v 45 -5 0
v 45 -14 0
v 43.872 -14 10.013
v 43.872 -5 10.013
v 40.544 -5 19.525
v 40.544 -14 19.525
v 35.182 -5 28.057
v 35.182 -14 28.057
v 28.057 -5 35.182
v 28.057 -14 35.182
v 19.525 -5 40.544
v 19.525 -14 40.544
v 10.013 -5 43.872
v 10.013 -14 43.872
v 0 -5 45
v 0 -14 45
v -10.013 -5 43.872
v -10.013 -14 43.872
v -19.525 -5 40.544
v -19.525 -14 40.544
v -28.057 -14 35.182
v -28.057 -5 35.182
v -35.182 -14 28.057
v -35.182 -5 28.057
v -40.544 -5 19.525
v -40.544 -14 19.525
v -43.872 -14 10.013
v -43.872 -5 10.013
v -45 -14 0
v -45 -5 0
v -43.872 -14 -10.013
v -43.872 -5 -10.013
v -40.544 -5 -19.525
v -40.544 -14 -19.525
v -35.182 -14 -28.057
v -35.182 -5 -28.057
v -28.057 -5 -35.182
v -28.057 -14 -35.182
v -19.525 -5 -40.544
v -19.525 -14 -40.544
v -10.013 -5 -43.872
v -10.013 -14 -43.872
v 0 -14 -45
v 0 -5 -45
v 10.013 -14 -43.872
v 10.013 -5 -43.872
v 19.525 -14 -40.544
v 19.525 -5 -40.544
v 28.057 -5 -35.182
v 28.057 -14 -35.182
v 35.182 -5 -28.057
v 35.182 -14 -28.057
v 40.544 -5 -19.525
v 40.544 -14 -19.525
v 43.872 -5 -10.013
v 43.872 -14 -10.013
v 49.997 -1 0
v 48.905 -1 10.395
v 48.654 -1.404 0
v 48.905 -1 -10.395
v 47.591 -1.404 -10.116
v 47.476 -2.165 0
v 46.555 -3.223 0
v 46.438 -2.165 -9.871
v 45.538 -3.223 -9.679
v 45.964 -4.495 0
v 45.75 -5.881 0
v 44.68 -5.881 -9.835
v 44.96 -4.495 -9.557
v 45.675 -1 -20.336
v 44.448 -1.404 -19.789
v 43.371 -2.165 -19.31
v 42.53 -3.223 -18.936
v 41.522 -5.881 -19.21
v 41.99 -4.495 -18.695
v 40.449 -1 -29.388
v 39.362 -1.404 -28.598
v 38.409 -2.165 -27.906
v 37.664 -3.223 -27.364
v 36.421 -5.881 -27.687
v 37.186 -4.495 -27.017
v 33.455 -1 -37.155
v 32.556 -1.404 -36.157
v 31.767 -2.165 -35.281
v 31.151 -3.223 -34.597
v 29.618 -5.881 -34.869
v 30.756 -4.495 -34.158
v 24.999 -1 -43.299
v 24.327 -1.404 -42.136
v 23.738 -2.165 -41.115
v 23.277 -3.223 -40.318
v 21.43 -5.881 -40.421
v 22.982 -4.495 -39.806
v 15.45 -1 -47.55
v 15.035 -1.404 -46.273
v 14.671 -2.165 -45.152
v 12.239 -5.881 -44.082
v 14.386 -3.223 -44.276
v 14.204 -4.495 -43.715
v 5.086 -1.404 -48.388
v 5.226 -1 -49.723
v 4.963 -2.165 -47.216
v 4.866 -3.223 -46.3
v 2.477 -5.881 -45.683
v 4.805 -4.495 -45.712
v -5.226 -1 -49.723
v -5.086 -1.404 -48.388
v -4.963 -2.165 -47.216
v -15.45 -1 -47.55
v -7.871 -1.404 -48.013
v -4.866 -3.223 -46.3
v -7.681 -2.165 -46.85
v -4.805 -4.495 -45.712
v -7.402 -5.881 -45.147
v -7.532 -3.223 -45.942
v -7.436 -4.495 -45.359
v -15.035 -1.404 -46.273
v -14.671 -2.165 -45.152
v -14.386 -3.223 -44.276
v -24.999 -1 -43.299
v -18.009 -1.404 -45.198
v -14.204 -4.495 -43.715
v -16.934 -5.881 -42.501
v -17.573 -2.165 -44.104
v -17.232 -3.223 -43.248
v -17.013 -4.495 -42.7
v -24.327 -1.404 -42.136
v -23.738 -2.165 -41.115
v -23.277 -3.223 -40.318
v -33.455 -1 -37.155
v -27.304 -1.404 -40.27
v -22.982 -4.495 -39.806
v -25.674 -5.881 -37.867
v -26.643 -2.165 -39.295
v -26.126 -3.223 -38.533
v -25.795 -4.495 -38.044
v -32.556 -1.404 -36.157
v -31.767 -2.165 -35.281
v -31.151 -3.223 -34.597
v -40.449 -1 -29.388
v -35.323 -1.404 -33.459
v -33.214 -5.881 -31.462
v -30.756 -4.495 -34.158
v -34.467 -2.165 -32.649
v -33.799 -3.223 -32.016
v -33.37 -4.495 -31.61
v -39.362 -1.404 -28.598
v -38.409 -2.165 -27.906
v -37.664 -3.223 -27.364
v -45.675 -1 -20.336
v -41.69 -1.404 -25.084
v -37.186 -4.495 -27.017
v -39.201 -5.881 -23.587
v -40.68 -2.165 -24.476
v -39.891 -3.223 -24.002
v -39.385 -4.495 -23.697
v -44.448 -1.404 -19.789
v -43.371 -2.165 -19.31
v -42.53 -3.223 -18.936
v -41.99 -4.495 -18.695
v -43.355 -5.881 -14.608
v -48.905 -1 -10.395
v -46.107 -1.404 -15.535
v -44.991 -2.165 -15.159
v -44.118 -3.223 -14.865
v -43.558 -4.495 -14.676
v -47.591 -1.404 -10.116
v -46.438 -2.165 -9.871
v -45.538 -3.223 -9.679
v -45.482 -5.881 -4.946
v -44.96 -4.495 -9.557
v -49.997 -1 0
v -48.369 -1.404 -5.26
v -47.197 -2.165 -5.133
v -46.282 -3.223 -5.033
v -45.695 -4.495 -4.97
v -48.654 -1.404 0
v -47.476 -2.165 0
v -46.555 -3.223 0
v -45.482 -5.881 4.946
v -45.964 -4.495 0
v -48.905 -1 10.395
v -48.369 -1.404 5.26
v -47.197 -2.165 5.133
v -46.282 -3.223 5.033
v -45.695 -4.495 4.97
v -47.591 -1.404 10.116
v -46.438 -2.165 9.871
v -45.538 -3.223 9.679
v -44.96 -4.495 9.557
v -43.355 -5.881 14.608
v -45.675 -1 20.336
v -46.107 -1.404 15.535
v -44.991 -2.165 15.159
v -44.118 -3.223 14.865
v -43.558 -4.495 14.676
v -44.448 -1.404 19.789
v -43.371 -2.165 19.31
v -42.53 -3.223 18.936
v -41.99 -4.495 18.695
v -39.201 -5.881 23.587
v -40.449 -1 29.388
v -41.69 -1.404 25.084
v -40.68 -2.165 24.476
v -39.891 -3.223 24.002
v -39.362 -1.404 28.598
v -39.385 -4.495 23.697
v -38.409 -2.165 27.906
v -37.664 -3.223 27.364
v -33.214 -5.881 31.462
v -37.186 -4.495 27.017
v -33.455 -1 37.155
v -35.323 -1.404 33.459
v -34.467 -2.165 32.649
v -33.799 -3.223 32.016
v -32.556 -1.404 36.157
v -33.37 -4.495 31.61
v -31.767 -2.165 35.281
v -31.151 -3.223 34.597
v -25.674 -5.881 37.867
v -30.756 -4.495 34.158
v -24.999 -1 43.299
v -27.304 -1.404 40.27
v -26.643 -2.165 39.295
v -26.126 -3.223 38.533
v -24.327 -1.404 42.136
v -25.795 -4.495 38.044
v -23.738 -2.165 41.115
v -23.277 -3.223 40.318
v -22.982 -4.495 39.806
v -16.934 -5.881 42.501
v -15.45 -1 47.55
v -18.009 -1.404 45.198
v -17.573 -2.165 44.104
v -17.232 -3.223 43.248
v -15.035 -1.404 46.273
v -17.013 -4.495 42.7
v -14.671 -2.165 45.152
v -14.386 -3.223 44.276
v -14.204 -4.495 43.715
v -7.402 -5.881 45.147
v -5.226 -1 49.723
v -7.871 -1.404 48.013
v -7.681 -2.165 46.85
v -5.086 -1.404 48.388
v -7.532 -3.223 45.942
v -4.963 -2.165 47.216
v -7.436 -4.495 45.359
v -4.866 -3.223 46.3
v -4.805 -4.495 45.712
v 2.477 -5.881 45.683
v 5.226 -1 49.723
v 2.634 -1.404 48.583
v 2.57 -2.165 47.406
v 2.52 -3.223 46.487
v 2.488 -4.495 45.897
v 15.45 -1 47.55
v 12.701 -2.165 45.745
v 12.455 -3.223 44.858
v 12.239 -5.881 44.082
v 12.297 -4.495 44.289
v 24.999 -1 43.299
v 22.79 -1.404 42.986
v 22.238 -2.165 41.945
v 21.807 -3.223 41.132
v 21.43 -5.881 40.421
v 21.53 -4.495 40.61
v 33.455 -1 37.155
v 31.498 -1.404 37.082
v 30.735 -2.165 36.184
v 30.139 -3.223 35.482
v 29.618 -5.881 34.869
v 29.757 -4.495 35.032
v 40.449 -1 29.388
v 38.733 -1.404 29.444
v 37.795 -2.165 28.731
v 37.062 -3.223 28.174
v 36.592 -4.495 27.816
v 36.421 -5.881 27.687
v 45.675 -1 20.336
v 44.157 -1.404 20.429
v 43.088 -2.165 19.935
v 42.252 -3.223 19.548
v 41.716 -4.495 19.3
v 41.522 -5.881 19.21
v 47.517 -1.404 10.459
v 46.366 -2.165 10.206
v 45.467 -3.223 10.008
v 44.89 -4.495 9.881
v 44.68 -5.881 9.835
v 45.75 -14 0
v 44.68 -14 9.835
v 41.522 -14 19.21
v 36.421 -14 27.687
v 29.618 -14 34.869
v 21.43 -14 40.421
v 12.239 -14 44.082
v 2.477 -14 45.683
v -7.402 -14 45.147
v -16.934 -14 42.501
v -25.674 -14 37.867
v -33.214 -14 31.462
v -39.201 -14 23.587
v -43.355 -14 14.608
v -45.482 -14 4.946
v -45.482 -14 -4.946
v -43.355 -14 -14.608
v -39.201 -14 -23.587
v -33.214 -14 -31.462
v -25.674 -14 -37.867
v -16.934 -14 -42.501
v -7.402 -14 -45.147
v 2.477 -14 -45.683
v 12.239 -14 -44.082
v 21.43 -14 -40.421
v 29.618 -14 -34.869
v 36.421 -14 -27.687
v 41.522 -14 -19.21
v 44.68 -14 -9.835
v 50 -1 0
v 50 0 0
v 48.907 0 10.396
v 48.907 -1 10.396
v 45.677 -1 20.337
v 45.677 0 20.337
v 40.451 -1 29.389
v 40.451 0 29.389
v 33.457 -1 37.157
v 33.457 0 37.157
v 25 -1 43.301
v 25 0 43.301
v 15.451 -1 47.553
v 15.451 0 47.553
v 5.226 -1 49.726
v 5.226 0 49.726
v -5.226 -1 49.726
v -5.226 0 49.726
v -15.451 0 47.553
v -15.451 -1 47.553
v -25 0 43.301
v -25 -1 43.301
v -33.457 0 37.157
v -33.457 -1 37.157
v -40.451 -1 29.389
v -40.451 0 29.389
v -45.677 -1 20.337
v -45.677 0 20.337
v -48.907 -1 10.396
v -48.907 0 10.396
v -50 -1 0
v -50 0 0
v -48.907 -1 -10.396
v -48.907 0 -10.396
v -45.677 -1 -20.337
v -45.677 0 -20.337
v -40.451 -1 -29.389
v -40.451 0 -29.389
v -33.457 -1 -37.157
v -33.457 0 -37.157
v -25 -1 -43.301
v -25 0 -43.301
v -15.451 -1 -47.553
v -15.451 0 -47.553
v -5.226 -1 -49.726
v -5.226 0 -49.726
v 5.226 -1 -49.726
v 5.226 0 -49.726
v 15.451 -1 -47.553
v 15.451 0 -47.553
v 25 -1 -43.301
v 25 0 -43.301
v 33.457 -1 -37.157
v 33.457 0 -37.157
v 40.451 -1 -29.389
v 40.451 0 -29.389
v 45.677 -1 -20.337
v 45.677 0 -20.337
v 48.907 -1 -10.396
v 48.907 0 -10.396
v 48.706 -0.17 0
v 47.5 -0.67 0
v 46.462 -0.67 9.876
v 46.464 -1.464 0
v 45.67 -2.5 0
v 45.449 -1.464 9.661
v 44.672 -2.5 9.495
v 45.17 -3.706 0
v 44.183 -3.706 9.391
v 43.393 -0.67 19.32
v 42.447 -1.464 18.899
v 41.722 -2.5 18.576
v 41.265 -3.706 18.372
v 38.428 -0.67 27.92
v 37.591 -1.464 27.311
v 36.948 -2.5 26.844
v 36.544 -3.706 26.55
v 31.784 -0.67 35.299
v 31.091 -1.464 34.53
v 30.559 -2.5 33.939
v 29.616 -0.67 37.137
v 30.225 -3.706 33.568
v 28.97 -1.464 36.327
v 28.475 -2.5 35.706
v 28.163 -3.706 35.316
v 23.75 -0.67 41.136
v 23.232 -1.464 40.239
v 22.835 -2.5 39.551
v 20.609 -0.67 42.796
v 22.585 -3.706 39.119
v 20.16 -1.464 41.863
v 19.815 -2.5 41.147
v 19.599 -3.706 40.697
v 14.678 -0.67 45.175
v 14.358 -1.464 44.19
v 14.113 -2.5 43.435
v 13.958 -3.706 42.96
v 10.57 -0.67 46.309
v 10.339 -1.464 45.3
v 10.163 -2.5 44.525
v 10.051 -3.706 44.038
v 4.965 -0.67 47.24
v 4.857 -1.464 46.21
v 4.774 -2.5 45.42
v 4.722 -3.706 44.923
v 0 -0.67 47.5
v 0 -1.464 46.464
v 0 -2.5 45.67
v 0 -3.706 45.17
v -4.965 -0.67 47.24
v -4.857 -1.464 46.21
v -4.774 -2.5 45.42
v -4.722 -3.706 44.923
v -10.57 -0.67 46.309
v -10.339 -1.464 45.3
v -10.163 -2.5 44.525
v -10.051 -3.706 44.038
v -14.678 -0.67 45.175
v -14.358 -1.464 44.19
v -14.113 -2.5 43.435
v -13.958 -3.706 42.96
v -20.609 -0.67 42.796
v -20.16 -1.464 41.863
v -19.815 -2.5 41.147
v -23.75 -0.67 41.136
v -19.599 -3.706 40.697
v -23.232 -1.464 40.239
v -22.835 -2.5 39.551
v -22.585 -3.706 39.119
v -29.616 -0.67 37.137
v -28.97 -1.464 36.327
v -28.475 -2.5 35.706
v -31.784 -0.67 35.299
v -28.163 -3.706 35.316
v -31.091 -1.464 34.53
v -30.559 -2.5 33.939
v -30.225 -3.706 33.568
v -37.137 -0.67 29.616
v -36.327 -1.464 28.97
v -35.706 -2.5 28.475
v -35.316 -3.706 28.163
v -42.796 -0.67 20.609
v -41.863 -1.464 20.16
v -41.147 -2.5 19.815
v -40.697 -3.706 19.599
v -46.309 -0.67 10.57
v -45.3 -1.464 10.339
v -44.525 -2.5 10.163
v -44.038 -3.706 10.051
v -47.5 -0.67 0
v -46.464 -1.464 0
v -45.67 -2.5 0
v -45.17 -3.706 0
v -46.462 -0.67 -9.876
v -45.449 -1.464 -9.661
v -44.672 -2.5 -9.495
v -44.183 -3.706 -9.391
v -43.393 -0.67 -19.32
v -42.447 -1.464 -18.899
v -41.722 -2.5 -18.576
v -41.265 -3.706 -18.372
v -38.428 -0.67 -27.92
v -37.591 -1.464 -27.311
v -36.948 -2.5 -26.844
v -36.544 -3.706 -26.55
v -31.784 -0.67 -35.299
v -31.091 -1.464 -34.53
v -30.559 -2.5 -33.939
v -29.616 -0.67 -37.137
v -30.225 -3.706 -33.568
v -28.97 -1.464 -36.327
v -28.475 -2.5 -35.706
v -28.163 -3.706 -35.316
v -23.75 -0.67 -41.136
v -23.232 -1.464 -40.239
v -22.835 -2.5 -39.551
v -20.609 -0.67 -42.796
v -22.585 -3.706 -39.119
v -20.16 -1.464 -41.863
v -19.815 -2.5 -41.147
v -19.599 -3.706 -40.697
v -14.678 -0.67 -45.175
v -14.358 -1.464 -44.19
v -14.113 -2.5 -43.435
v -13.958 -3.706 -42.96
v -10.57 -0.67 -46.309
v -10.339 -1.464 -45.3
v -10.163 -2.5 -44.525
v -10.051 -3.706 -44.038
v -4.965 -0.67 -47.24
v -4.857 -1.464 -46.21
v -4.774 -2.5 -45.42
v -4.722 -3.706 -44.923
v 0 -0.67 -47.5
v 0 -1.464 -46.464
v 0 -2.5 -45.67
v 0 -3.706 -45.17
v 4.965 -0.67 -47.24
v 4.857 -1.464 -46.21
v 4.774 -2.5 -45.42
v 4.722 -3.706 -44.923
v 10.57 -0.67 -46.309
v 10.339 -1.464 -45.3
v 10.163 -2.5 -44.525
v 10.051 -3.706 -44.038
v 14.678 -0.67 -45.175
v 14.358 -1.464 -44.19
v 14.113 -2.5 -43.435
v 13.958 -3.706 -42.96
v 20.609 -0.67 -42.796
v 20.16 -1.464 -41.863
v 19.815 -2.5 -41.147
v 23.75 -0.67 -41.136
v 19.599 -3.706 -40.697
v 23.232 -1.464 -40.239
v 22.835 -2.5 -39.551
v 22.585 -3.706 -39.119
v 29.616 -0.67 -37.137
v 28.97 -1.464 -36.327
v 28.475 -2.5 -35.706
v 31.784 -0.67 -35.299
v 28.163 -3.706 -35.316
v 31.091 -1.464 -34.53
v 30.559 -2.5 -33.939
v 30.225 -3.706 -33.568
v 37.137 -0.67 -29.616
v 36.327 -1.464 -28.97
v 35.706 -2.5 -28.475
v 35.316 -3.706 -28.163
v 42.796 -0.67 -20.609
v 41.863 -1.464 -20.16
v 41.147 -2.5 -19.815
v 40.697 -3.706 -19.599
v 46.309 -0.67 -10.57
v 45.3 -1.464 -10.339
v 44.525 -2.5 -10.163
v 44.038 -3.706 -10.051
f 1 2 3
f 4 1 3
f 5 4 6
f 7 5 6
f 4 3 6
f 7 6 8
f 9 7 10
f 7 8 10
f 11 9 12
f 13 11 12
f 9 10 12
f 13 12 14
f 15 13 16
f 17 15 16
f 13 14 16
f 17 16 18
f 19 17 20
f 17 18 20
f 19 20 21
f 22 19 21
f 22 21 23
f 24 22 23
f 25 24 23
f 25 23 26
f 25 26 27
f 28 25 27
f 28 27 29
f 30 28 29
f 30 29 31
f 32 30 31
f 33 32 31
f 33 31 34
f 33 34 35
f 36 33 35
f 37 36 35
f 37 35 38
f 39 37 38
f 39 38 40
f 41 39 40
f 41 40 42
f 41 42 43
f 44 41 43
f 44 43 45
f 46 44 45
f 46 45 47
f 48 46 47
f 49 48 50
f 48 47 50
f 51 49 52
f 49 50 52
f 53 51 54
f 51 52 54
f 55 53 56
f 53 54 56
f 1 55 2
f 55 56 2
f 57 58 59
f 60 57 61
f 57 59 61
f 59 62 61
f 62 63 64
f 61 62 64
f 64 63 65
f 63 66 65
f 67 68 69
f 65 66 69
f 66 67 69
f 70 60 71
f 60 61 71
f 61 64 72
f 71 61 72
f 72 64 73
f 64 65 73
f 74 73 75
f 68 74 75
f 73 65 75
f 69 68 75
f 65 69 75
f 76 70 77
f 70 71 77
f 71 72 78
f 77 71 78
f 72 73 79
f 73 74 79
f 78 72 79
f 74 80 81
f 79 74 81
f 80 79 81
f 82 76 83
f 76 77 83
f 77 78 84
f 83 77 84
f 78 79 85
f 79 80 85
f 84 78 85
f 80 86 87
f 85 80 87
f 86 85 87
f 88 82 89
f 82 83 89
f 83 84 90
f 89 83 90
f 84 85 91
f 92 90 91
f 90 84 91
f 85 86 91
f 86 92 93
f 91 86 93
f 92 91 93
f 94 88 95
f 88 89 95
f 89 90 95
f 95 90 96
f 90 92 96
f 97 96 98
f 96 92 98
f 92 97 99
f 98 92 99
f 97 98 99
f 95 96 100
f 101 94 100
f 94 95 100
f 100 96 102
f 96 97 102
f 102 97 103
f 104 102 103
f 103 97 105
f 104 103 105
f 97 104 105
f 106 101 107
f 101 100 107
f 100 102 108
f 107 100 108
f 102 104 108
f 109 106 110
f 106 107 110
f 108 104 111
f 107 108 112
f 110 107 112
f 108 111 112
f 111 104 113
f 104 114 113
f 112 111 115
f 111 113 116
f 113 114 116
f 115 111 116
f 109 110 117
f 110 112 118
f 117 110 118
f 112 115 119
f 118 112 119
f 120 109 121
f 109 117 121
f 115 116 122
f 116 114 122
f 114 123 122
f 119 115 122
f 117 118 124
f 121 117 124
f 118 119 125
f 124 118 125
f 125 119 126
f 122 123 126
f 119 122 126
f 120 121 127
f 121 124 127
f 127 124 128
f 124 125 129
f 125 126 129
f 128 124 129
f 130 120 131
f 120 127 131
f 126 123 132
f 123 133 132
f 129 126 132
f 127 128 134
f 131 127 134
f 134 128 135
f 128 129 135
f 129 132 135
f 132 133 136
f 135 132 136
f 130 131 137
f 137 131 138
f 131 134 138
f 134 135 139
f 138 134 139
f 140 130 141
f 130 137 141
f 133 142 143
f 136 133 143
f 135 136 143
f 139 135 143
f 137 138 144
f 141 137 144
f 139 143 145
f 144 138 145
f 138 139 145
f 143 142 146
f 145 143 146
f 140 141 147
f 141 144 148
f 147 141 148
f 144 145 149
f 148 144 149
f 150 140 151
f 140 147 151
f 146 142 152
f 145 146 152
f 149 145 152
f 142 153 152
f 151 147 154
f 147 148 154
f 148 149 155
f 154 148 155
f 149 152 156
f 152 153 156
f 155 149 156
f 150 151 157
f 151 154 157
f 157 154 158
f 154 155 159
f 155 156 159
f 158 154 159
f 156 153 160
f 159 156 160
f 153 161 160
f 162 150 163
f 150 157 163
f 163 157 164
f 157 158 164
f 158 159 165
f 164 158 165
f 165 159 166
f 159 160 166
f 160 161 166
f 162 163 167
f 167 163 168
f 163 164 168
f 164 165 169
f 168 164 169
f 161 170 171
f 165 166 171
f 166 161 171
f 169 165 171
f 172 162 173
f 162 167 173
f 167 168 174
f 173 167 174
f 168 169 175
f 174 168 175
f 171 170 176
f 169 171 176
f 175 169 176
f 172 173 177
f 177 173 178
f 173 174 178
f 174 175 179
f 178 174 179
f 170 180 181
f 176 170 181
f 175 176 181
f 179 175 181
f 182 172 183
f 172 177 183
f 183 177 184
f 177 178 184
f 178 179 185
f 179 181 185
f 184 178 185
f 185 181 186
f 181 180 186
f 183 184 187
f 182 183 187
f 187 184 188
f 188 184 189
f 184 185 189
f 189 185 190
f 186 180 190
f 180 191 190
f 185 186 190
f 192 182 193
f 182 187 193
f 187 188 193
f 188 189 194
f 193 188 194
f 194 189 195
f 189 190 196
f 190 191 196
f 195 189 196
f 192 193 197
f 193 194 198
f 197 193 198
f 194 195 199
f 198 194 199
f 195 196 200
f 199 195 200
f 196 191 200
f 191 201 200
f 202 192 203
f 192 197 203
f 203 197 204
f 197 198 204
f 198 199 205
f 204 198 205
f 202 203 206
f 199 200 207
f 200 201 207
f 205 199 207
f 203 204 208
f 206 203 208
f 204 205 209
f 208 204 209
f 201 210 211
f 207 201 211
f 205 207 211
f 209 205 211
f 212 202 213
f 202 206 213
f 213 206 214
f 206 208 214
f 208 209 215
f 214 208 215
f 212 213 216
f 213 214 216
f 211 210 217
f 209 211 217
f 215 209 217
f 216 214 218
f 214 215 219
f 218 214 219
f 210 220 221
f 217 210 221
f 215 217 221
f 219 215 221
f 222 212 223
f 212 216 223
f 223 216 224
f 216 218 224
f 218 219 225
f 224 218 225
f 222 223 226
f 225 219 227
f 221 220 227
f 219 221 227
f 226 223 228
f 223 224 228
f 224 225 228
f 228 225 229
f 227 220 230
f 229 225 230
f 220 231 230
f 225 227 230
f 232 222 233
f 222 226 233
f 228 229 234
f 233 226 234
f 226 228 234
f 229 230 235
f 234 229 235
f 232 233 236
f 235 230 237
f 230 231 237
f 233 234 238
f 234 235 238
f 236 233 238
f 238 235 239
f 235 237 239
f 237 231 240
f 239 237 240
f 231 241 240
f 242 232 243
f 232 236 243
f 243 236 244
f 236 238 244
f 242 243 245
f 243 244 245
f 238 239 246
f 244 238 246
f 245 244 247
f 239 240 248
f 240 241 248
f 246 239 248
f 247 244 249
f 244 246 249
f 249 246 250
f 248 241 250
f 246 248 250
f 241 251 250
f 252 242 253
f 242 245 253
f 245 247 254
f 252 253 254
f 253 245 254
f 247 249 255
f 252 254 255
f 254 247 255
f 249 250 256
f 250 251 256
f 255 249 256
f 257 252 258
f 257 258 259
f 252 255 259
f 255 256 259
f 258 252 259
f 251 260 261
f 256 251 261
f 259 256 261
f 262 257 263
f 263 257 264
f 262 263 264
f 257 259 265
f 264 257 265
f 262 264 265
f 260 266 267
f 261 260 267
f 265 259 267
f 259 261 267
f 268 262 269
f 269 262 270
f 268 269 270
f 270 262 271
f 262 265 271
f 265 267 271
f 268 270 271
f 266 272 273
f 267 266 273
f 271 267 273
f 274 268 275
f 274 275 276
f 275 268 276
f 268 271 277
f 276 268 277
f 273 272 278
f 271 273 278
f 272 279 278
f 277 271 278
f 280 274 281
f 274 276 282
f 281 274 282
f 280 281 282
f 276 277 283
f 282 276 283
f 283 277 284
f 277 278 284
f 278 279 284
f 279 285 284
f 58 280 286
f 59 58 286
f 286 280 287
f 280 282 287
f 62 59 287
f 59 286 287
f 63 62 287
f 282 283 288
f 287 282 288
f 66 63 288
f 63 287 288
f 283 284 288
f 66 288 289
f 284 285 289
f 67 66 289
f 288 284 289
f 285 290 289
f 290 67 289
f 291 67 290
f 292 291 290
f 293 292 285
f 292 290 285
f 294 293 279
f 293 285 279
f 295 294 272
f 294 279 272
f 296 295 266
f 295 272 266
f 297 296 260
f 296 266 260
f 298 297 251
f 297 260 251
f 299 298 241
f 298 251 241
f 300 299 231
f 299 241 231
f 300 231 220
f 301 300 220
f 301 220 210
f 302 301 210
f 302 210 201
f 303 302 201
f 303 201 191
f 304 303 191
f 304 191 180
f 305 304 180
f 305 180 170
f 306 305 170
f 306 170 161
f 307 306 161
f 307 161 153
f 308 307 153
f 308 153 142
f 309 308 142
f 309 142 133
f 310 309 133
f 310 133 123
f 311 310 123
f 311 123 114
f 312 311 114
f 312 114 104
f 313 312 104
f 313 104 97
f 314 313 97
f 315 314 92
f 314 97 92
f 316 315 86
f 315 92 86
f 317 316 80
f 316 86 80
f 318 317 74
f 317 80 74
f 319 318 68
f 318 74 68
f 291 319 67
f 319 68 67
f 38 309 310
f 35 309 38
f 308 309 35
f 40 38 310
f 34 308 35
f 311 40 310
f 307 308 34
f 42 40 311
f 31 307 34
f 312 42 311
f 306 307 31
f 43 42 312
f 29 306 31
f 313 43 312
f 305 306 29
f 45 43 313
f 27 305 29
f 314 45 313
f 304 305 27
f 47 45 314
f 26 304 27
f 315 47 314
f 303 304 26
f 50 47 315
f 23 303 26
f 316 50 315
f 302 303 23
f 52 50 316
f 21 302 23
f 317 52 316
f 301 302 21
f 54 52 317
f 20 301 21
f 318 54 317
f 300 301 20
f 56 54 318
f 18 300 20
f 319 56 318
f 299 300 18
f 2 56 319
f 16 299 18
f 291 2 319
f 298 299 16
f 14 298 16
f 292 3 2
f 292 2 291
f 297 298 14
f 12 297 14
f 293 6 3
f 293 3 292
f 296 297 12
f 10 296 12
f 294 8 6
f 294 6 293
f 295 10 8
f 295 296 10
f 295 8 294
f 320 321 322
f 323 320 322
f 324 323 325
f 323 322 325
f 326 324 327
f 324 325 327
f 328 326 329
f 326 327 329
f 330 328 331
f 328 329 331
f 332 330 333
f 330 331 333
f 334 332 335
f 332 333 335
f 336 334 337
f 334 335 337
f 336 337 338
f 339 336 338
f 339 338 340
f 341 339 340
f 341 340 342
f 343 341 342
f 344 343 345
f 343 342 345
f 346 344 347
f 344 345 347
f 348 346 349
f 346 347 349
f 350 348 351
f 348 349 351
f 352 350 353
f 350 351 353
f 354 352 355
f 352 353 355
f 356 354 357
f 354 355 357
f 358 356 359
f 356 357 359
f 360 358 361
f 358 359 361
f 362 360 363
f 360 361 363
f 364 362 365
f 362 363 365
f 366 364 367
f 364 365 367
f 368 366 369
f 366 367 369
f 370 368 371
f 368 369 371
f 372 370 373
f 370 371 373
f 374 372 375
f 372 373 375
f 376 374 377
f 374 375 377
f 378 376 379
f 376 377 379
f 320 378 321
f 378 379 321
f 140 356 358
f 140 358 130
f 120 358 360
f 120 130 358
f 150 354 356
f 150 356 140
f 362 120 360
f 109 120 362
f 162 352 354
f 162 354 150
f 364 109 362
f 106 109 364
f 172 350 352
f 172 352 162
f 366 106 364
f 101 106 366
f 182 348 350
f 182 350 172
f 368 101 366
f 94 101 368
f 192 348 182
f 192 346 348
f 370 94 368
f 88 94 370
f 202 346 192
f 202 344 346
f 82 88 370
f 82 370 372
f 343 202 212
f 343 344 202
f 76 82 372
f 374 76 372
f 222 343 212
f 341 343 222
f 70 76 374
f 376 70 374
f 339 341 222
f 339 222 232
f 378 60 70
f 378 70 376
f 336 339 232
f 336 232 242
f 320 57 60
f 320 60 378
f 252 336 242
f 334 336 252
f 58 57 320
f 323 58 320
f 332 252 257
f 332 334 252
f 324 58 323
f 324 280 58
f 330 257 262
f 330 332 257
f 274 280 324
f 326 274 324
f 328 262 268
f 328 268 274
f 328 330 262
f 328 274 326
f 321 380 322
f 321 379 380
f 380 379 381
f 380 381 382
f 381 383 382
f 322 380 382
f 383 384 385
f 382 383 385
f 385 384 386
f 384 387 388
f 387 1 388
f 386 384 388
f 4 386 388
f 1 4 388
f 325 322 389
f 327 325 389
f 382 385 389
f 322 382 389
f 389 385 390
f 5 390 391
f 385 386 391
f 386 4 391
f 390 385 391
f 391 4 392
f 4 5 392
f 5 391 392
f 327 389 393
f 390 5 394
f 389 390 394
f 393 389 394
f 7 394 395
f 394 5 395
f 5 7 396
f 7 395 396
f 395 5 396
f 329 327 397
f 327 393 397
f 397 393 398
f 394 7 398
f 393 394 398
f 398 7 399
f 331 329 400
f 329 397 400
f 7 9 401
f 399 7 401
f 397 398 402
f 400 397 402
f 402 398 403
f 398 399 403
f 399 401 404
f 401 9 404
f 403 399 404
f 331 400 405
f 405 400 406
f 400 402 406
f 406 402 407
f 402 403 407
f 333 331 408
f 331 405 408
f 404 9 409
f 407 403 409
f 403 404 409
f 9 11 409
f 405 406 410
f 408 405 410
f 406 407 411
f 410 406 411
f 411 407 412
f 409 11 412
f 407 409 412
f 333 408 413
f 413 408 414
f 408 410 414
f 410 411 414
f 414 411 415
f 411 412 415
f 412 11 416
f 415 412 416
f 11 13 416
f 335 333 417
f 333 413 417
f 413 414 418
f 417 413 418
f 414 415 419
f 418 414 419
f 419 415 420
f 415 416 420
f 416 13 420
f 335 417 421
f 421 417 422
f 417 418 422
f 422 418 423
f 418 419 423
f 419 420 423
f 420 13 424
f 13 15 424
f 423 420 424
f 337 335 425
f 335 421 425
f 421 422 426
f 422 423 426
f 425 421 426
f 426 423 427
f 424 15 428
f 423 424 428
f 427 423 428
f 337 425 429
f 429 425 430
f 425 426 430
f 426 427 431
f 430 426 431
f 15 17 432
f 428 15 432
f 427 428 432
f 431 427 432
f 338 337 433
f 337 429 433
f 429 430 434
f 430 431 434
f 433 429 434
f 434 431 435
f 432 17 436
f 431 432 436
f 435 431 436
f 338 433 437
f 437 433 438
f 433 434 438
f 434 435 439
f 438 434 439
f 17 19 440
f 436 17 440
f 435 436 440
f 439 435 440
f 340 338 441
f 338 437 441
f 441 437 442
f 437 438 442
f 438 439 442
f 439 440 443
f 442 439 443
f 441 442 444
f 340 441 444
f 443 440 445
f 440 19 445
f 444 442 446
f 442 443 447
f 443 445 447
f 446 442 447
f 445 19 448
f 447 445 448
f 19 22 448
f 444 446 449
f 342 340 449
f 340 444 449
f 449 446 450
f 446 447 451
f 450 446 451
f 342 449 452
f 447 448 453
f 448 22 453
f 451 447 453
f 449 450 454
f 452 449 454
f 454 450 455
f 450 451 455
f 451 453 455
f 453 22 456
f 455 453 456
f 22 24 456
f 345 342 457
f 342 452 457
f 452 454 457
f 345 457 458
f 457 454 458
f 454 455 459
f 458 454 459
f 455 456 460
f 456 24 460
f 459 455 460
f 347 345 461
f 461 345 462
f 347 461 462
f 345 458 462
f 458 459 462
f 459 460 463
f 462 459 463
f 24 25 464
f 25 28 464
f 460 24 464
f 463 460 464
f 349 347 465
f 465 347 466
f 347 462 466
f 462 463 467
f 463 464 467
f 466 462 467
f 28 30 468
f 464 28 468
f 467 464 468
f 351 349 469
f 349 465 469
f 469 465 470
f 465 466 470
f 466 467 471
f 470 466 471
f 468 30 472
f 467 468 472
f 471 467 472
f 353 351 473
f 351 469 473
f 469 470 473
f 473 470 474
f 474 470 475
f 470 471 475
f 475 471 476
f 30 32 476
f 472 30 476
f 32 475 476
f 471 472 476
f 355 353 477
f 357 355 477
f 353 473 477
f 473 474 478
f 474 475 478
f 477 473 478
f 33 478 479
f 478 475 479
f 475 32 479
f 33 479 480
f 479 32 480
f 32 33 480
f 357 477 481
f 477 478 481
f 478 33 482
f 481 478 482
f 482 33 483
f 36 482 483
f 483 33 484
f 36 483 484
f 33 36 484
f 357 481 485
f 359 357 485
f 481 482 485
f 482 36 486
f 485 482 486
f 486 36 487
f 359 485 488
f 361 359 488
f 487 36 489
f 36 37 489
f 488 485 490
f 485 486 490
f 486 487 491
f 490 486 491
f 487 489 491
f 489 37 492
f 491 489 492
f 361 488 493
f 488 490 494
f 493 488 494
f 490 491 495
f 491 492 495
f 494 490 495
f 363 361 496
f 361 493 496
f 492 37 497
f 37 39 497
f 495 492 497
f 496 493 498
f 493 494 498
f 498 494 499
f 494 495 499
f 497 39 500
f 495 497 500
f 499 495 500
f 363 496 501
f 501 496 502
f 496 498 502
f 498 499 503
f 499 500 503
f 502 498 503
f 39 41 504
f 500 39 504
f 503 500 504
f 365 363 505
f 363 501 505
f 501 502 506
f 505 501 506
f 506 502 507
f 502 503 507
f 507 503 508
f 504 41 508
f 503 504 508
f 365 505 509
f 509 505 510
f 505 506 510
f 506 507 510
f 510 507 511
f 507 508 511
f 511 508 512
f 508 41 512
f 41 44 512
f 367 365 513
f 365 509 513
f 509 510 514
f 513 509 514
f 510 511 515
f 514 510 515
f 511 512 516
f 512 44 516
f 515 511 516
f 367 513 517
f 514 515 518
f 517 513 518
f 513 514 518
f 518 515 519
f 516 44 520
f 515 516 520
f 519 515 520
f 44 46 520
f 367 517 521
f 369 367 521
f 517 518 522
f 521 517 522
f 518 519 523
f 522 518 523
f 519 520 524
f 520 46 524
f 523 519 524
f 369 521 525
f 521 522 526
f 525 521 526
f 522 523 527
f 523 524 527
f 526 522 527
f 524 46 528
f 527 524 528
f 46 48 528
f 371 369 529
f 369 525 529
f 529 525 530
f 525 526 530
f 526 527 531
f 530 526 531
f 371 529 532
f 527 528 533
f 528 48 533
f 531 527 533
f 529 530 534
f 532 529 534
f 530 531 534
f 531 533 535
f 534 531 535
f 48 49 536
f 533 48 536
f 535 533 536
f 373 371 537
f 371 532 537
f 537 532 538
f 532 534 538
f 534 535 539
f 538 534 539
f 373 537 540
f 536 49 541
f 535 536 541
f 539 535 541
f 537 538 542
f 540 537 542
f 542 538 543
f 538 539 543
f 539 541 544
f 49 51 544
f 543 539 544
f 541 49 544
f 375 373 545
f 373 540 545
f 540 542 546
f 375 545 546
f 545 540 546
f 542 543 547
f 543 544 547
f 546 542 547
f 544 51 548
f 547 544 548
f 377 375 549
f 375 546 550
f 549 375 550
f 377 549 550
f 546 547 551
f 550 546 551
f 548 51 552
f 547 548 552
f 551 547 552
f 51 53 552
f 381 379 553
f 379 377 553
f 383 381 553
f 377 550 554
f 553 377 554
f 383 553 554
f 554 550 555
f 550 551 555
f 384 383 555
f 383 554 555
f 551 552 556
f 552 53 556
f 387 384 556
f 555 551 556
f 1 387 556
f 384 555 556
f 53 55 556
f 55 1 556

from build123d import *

# Parameters (mm, degrees)
F0_R     = 50
F0_R_2   = 45
F1_DEPTH = 1
F2_R     = 45.75
F3_DEPTH = 14
F5_R     = 45
F6_DEPTH = 17
F7_R     = 4.99999


# Not quite as in the source:
# - a fillet or chamfer that OpenCascade refuses, or shapes differently, is made with other operations: its cross-section is extruded or revolved along the edge and cut away or added
# - a fillet or chamfer is up to 0.001 mm smaller than in the source, because OpenCascade refuses the exact size


with BuildPart() as f1:
    # F0 (on Front) → F1 (new body)
    with BuildSketch(Plane.XZ):
        Circle(F0_R)
        Circle(F0_R_2, mode=Mode.SUBTRACT)
    extrude(amount=F1_DEPTH)

    # F2 (on Front) → F3 (join)
    with BuildSketch(Plane.XZ):
        Circle(F2_R)
    extrude(amount=F3_DEPTH)

    # F4: fillet of radius 5 on 1 edges, made by hand

    # F4_s1 → F4_t2 (revolve)
    with BuildSketch(Plane.XY):
        with BuildLine():
            ThreePointArc((49.9999399343, -0.9996045356), (46.9582217487, -2.6840834341), (45.7496, -5.9442601394))
            Line((45.7496, -5.9442601394), (45.2494634315, -5.9442601394))
            ThreePointArc((45.2494634315, -5.9442601394), (45.2498634315, -3.4721300697), (45.2498634315, -1))
            Line((45.2498634315, -1), (45.75, -0.4998634315))
            ThreePointArc((45.75, -0.4998634315), (47.8749699672, -0.4998634315), (49.9248373592, -0.5051389752))
            Line((49.9248373592, -0.5051389752), (49.9999399343, -0.9996045356))
        make_face()
    revolve(axis=Axis((0, -1, 0), (0, 1, 0)))

    # F5 (on face) → F6 (cut)
    with BuildSketch(Plane.XZ.offset(14)):
        Circle(F5_R)
    extrude(amount=-F6_DEPTH, mode=Mode.SUBTRACT)

    # F7 (radius 5 in the source; OpenCascade refuses exactly that, so slightly less here)
    f7_edges = [f1.edges().sort_by_distance(p)[0] for p in [
        (-45, 0, 0),
    ]]
    fillet(f7_edges, radius=F7_R)


solid = f1.part
